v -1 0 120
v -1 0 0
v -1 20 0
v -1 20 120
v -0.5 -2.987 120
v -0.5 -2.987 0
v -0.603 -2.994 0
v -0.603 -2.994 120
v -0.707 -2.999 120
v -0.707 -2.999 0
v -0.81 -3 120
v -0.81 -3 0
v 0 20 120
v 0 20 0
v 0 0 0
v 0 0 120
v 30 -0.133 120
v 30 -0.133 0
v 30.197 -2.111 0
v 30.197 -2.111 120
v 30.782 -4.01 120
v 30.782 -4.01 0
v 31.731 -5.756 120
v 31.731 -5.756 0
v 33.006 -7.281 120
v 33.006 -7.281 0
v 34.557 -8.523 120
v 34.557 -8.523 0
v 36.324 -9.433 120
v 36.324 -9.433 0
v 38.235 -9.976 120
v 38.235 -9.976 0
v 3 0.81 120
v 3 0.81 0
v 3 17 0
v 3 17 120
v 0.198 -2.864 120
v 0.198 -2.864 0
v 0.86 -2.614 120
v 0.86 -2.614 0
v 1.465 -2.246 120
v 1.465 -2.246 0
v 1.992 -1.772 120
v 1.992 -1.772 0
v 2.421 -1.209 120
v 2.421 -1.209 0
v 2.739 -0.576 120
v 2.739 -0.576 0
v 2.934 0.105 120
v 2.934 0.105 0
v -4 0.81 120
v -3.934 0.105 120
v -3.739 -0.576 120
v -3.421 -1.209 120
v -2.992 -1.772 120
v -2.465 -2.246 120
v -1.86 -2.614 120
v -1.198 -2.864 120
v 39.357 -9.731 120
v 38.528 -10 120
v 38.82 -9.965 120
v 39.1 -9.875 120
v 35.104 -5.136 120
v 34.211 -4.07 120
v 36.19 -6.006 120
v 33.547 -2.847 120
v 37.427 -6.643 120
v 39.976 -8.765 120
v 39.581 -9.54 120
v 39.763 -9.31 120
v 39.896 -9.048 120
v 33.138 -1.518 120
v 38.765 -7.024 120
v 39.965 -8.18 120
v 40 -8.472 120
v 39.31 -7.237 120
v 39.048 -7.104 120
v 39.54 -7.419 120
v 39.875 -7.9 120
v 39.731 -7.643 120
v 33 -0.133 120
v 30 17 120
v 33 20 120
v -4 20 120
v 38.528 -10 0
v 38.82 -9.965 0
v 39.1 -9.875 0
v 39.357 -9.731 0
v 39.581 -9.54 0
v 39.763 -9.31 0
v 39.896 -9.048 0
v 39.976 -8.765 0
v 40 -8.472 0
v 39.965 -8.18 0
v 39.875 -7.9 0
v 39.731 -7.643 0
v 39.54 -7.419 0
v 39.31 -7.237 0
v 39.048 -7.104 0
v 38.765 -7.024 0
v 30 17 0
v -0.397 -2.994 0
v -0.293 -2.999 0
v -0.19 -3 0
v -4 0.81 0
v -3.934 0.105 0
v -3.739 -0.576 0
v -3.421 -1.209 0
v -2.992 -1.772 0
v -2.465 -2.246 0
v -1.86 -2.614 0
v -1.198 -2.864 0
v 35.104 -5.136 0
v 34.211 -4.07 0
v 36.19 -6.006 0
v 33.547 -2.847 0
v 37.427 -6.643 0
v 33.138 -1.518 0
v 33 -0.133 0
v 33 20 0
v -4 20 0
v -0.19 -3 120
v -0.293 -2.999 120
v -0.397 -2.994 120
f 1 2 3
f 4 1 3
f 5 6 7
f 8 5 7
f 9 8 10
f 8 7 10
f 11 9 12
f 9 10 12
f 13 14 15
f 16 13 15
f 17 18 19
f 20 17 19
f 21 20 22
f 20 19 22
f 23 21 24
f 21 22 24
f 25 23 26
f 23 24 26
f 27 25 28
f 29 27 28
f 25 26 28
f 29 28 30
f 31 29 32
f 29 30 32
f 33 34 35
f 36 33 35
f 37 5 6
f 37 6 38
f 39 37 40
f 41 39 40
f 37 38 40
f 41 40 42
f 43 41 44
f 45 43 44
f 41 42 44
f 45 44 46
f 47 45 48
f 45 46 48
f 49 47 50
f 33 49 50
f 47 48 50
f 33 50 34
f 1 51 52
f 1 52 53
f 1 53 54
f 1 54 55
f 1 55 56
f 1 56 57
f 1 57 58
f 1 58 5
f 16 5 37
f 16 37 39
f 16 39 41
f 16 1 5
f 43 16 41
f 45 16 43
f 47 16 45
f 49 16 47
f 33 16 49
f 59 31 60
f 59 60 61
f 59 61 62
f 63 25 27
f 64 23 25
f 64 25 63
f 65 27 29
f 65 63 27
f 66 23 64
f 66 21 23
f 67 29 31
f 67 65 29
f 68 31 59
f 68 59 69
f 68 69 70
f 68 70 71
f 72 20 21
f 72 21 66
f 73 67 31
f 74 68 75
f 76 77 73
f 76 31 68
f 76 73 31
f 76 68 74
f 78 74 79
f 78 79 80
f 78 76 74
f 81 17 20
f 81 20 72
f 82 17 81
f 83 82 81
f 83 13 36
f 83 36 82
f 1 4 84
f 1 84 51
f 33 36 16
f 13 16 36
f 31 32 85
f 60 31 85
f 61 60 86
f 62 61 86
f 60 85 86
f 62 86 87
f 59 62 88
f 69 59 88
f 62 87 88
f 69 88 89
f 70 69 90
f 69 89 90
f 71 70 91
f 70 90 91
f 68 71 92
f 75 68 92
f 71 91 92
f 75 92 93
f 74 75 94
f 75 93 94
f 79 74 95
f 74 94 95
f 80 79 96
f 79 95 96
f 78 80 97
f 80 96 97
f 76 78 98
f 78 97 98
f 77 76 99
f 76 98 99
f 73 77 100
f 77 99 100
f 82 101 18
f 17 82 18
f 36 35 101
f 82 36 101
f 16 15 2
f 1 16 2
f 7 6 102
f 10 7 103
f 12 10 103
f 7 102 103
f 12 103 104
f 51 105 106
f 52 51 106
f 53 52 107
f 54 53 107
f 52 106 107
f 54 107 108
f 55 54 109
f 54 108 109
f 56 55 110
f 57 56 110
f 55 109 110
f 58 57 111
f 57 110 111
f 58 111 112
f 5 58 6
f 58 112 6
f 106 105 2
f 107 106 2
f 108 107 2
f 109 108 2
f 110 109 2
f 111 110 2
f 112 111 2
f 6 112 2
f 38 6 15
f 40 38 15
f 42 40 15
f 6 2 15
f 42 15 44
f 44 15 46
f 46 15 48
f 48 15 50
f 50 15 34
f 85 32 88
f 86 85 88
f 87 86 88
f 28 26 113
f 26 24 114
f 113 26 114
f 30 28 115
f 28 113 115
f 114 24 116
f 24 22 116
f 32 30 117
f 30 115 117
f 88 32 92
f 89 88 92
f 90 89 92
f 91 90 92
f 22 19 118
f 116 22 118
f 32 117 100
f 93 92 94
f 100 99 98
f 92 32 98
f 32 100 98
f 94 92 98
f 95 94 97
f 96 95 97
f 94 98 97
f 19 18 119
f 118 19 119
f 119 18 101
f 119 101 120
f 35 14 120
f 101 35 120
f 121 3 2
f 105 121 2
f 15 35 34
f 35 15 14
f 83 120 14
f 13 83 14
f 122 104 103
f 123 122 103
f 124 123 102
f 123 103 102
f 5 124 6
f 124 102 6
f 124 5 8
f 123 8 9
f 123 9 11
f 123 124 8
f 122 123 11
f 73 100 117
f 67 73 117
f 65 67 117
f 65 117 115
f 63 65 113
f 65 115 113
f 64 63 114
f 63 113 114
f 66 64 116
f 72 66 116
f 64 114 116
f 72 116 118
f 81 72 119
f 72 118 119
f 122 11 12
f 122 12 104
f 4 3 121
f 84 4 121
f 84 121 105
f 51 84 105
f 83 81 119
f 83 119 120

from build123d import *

# Parameters (mm, degrees)
F1_DEPTH = 120


with BuildPart() as f1:
    # F0 (on Top) → F1 (new body)
    with BuildSketch(Plane.XY):
        with BuildLine():
            ThreePointArc((-0.19, -3), (-0.345129, -2.996841), (-0.5, -2.987368))
            ThreePointArc((-0.5, -2.987368), (-0.654871, -2.996841), (-0.81, -3))
            Line((-0.81, -3), (-0.19, -3))
        make_face()
        with BuildLine():
            Line((-1, 0), (-1, 20))
            Line((-1, 20), (-4, 20))
            Line((-4, 20), (-4, 0.81))
            ThreePointArc((-4, 0.81), (-2.991535, -1.77215), (-0.5, -2.987368))
            ThreePointArc((-0.5, -2.987368), (1.991535, -1.77215), (3, 0.81))
            Line((3, 0.81), (3, 17))
            Line((3, 17), (30, 17))
            Line((30, 17), (30, -0.1334))
            ThreePointArc((30, -0.1334), (32.33035, -6.550289), (38.235294, -9.976459))
            ThreePointArc((38.235294, -9.976459), (39.976459, -8.764706), (38.764706, -7.023541))
            ThreePointArc((38.764706, -7.023541), (34.631245, -4.625222), (33, -0.1334))
            Line((33, -0.1334), (33, 20))
            Line((33, 20), (0, 20))
            Line((0, 20), (0, 0))
            Line((0, 0), (-1, 0))
        make_face()
    extrude(amount=F1_DEPTH)


solid = f1.part
